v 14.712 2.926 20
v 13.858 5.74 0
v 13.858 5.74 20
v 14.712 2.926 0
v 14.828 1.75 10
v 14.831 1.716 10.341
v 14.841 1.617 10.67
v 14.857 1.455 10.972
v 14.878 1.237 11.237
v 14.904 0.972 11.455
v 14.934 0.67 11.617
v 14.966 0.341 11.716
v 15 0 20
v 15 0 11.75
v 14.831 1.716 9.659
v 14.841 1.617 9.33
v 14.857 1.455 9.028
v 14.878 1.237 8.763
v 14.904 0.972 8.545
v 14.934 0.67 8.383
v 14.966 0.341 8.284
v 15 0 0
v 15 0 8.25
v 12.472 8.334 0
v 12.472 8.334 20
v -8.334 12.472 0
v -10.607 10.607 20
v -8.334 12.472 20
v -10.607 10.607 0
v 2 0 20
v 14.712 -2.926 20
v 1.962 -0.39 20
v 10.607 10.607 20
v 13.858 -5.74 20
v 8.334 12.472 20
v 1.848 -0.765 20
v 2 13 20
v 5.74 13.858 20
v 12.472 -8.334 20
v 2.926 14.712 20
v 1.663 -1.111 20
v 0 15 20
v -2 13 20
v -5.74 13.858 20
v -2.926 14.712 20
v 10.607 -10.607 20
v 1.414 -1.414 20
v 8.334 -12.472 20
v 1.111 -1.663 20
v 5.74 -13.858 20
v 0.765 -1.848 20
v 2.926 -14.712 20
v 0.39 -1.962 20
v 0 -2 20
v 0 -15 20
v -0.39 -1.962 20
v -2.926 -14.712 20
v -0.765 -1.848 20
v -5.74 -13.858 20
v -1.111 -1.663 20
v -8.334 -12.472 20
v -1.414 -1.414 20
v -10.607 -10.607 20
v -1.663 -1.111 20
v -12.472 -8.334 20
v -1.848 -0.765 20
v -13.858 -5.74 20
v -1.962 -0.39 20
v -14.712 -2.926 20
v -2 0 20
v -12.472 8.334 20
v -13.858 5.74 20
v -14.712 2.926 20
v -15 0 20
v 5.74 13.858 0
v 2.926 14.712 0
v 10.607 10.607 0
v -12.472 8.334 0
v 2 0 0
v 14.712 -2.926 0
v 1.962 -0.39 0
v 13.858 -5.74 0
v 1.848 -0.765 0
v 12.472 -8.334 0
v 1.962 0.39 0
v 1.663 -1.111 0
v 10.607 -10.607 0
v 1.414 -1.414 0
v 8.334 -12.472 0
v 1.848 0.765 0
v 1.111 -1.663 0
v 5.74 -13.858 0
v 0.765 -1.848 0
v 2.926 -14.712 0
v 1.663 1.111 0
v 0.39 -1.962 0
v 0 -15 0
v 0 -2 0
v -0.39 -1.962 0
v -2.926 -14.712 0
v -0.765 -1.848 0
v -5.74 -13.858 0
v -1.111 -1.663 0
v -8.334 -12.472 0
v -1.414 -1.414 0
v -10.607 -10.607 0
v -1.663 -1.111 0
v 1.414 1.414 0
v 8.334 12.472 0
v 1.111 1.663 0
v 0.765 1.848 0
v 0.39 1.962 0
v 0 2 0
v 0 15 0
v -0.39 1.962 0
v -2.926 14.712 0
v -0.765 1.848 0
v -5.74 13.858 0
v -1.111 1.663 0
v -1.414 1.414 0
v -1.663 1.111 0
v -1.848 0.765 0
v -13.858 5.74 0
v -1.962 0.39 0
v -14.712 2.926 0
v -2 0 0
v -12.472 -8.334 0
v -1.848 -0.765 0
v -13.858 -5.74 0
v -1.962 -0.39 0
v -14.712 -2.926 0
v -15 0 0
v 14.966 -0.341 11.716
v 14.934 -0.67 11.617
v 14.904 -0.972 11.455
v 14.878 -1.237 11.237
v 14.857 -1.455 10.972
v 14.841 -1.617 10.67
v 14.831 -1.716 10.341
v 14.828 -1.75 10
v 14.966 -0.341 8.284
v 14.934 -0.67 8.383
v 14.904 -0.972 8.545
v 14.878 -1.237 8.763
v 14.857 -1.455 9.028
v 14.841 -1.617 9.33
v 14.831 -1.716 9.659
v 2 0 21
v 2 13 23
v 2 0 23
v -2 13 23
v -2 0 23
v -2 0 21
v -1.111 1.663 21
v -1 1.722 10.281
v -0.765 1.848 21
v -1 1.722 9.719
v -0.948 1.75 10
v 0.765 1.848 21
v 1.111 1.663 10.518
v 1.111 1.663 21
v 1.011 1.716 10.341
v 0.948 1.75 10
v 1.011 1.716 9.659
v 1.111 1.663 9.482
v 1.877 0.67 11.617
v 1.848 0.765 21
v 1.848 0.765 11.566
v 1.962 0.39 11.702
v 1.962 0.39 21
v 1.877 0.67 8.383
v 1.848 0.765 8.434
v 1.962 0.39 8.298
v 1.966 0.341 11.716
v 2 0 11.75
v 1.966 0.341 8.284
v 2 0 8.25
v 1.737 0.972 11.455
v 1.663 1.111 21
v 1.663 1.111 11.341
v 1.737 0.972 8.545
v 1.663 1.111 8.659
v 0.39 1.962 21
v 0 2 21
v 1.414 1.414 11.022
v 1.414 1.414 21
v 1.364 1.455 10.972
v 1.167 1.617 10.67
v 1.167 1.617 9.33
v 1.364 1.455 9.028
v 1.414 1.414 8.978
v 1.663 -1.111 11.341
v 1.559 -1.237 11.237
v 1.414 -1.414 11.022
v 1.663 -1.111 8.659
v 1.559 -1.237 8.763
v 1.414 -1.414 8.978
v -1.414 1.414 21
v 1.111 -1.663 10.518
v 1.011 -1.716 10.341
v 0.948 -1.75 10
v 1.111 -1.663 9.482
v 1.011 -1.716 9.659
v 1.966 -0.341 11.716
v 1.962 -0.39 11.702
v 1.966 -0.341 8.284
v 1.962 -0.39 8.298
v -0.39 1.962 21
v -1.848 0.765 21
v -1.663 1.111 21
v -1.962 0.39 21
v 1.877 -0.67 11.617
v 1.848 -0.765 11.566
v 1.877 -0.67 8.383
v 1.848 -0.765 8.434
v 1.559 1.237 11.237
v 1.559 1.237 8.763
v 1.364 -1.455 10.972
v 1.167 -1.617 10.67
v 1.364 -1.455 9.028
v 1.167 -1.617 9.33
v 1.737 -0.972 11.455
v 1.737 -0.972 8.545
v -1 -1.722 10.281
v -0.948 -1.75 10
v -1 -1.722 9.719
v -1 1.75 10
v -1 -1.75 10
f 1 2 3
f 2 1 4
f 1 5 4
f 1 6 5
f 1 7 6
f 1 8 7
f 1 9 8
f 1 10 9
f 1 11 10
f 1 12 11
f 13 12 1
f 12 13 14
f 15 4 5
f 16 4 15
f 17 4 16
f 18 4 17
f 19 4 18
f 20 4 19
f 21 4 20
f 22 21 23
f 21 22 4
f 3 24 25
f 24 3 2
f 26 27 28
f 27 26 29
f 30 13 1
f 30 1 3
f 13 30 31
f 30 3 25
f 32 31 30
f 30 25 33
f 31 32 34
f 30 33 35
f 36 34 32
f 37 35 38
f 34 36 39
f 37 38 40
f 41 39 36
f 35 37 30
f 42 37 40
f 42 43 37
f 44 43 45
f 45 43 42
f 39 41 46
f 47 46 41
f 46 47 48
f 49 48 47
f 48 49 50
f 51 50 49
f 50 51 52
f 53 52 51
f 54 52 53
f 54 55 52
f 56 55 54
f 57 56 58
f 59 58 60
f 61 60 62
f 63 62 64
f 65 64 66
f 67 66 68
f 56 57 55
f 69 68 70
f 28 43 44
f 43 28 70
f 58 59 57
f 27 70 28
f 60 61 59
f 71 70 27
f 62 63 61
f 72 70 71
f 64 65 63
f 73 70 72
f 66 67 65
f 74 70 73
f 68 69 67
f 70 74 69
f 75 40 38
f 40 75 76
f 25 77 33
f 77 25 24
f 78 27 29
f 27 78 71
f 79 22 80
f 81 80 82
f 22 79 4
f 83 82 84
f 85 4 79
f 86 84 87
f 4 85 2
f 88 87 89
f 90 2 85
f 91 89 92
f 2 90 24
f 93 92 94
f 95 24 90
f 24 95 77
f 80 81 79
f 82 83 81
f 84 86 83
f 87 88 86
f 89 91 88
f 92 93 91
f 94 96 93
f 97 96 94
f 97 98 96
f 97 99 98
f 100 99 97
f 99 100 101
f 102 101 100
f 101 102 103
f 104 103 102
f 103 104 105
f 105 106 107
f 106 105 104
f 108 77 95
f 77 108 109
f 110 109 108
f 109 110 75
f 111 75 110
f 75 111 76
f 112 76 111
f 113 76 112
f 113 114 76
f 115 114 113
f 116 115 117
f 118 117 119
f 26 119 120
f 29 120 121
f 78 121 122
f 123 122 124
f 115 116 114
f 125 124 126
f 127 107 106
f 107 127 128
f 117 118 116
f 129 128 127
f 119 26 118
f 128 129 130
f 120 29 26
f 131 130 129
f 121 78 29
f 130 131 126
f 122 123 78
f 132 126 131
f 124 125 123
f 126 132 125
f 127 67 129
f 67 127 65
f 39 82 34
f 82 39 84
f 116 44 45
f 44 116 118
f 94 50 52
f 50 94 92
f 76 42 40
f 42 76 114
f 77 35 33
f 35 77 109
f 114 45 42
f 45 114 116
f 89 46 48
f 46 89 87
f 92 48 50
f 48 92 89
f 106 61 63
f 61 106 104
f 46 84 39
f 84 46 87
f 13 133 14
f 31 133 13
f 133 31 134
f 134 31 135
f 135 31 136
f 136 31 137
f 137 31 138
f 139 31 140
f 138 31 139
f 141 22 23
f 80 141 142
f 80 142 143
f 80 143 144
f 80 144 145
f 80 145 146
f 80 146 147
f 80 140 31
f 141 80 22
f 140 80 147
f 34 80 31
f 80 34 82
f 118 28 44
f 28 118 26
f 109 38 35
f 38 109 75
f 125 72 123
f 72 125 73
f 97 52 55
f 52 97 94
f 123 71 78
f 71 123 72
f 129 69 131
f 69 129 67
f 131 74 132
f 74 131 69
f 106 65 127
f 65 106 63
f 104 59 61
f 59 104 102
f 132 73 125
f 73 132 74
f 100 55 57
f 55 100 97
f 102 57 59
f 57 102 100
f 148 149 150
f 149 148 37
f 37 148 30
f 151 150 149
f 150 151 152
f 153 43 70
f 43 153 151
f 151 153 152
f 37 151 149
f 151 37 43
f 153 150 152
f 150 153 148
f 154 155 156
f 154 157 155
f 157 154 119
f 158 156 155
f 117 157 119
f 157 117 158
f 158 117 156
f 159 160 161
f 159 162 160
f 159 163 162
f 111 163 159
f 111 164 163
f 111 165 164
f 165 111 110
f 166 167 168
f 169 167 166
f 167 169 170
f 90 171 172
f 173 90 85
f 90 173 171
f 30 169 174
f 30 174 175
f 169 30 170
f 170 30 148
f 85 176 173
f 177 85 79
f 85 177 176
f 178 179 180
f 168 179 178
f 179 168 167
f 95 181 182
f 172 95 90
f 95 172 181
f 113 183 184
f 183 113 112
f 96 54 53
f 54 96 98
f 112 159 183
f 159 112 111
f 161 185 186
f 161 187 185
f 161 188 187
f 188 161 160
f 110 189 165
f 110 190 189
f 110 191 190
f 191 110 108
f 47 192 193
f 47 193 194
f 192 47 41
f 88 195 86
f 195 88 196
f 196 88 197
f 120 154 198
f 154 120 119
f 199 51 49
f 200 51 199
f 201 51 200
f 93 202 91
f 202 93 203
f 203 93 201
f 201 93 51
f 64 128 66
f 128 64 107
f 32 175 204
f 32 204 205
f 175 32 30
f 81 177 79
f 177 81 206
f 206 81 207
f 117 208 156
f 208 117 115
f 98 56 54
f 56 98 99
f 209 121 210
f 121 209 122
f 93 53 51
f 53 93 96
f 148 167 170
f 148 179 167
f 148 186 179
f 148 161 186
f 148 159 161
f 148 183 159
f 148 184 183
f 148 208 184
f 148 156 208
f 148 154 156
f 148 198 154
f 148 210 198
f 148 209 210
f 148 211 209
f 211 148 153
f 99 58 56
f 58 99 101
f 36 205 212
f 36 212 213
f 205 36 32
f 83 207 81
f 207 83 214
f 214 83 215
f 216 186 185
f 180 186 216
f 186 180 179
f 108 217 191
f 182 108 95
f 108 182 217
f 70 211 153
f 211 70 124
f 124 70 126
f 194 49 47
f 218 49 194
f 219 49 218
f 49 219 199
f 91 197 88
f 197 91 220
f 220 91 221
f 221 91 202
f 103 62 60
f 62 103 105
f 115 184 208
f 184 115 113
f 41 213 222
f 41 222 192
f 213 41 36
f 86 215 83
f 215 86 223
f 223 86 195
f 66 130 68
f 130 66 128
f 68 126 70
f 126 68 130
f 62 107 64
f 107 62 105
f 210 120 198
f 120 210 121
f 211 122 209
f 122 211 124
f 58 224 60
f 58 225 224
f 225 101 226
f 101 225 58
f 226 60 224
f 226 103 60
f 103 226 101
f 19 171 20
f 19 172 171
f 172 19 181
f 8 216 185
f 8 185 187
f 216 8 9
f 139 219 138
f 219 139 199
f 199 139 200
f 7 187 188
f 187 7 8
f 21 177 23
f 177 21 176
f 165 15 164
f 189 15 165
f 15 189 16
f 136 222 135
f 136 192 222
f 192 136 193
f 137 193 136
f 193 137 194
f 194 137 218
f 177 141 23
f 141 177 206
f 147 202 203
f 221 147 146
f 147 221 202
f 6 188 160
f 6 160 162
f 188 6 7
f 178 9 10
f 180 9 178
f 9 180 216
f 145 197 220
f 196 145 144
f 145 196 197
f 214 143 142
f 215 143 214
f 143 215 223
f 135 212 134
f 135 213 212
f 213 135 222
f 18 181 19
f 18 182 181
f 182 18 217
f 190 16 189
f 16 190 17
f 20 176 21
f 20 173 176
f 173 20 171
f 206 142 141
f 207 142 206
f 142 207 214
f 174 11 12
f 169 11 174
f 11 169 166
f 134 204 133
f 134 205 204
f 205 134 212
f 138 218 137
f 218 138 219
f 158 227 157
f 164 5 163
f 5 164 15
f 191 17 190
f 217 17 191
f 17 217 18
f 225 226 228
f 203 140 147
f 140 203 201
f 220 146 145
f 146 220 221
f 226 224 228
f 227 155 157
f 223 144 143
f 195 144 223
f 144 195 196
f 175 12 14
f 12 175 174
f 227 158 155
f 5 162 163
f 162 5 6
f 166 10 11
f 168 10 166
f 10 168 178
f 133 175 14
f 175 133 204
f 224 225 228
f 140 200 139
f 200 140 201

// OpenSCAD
$fn = 32;

// ----------------------------------------------------------------------
// Control knob: pointer knob
// ----------------------------------------------------------------------

// --- parameters (mm) ---
rib_w = 4;                // pointer rib width
rib_h = 4;                // pointer rib height
knob_d = 30;              // knob body diameter
knob_h = 20;              // knob body height
bore_d = 4;               // shaft bore diameter
set_d = 3.5;              // set screw bore diameter

rib_poke = rib_h - 1;  // rib height above the top
total_h = knob_h + rib_h - 1;  // overall height

difference() {
  union() {
    cylinder(h = knob_h, d = knob_d);
    translate([-rib_w / 2, 0, knob_h - 1])
      cube([rib_w, knob_d / 2 - 2, rib_h]);
  }
  translate([0, 0, -1]) cylinder(h = knob_h + 2, d = bore_d);
  translate([-1, 0, knob_h / 2]) rotate([0, 90, 0])
    cylinder(h = knob_d / 2 + bore_d / 2 + 2, d = set_d);}
